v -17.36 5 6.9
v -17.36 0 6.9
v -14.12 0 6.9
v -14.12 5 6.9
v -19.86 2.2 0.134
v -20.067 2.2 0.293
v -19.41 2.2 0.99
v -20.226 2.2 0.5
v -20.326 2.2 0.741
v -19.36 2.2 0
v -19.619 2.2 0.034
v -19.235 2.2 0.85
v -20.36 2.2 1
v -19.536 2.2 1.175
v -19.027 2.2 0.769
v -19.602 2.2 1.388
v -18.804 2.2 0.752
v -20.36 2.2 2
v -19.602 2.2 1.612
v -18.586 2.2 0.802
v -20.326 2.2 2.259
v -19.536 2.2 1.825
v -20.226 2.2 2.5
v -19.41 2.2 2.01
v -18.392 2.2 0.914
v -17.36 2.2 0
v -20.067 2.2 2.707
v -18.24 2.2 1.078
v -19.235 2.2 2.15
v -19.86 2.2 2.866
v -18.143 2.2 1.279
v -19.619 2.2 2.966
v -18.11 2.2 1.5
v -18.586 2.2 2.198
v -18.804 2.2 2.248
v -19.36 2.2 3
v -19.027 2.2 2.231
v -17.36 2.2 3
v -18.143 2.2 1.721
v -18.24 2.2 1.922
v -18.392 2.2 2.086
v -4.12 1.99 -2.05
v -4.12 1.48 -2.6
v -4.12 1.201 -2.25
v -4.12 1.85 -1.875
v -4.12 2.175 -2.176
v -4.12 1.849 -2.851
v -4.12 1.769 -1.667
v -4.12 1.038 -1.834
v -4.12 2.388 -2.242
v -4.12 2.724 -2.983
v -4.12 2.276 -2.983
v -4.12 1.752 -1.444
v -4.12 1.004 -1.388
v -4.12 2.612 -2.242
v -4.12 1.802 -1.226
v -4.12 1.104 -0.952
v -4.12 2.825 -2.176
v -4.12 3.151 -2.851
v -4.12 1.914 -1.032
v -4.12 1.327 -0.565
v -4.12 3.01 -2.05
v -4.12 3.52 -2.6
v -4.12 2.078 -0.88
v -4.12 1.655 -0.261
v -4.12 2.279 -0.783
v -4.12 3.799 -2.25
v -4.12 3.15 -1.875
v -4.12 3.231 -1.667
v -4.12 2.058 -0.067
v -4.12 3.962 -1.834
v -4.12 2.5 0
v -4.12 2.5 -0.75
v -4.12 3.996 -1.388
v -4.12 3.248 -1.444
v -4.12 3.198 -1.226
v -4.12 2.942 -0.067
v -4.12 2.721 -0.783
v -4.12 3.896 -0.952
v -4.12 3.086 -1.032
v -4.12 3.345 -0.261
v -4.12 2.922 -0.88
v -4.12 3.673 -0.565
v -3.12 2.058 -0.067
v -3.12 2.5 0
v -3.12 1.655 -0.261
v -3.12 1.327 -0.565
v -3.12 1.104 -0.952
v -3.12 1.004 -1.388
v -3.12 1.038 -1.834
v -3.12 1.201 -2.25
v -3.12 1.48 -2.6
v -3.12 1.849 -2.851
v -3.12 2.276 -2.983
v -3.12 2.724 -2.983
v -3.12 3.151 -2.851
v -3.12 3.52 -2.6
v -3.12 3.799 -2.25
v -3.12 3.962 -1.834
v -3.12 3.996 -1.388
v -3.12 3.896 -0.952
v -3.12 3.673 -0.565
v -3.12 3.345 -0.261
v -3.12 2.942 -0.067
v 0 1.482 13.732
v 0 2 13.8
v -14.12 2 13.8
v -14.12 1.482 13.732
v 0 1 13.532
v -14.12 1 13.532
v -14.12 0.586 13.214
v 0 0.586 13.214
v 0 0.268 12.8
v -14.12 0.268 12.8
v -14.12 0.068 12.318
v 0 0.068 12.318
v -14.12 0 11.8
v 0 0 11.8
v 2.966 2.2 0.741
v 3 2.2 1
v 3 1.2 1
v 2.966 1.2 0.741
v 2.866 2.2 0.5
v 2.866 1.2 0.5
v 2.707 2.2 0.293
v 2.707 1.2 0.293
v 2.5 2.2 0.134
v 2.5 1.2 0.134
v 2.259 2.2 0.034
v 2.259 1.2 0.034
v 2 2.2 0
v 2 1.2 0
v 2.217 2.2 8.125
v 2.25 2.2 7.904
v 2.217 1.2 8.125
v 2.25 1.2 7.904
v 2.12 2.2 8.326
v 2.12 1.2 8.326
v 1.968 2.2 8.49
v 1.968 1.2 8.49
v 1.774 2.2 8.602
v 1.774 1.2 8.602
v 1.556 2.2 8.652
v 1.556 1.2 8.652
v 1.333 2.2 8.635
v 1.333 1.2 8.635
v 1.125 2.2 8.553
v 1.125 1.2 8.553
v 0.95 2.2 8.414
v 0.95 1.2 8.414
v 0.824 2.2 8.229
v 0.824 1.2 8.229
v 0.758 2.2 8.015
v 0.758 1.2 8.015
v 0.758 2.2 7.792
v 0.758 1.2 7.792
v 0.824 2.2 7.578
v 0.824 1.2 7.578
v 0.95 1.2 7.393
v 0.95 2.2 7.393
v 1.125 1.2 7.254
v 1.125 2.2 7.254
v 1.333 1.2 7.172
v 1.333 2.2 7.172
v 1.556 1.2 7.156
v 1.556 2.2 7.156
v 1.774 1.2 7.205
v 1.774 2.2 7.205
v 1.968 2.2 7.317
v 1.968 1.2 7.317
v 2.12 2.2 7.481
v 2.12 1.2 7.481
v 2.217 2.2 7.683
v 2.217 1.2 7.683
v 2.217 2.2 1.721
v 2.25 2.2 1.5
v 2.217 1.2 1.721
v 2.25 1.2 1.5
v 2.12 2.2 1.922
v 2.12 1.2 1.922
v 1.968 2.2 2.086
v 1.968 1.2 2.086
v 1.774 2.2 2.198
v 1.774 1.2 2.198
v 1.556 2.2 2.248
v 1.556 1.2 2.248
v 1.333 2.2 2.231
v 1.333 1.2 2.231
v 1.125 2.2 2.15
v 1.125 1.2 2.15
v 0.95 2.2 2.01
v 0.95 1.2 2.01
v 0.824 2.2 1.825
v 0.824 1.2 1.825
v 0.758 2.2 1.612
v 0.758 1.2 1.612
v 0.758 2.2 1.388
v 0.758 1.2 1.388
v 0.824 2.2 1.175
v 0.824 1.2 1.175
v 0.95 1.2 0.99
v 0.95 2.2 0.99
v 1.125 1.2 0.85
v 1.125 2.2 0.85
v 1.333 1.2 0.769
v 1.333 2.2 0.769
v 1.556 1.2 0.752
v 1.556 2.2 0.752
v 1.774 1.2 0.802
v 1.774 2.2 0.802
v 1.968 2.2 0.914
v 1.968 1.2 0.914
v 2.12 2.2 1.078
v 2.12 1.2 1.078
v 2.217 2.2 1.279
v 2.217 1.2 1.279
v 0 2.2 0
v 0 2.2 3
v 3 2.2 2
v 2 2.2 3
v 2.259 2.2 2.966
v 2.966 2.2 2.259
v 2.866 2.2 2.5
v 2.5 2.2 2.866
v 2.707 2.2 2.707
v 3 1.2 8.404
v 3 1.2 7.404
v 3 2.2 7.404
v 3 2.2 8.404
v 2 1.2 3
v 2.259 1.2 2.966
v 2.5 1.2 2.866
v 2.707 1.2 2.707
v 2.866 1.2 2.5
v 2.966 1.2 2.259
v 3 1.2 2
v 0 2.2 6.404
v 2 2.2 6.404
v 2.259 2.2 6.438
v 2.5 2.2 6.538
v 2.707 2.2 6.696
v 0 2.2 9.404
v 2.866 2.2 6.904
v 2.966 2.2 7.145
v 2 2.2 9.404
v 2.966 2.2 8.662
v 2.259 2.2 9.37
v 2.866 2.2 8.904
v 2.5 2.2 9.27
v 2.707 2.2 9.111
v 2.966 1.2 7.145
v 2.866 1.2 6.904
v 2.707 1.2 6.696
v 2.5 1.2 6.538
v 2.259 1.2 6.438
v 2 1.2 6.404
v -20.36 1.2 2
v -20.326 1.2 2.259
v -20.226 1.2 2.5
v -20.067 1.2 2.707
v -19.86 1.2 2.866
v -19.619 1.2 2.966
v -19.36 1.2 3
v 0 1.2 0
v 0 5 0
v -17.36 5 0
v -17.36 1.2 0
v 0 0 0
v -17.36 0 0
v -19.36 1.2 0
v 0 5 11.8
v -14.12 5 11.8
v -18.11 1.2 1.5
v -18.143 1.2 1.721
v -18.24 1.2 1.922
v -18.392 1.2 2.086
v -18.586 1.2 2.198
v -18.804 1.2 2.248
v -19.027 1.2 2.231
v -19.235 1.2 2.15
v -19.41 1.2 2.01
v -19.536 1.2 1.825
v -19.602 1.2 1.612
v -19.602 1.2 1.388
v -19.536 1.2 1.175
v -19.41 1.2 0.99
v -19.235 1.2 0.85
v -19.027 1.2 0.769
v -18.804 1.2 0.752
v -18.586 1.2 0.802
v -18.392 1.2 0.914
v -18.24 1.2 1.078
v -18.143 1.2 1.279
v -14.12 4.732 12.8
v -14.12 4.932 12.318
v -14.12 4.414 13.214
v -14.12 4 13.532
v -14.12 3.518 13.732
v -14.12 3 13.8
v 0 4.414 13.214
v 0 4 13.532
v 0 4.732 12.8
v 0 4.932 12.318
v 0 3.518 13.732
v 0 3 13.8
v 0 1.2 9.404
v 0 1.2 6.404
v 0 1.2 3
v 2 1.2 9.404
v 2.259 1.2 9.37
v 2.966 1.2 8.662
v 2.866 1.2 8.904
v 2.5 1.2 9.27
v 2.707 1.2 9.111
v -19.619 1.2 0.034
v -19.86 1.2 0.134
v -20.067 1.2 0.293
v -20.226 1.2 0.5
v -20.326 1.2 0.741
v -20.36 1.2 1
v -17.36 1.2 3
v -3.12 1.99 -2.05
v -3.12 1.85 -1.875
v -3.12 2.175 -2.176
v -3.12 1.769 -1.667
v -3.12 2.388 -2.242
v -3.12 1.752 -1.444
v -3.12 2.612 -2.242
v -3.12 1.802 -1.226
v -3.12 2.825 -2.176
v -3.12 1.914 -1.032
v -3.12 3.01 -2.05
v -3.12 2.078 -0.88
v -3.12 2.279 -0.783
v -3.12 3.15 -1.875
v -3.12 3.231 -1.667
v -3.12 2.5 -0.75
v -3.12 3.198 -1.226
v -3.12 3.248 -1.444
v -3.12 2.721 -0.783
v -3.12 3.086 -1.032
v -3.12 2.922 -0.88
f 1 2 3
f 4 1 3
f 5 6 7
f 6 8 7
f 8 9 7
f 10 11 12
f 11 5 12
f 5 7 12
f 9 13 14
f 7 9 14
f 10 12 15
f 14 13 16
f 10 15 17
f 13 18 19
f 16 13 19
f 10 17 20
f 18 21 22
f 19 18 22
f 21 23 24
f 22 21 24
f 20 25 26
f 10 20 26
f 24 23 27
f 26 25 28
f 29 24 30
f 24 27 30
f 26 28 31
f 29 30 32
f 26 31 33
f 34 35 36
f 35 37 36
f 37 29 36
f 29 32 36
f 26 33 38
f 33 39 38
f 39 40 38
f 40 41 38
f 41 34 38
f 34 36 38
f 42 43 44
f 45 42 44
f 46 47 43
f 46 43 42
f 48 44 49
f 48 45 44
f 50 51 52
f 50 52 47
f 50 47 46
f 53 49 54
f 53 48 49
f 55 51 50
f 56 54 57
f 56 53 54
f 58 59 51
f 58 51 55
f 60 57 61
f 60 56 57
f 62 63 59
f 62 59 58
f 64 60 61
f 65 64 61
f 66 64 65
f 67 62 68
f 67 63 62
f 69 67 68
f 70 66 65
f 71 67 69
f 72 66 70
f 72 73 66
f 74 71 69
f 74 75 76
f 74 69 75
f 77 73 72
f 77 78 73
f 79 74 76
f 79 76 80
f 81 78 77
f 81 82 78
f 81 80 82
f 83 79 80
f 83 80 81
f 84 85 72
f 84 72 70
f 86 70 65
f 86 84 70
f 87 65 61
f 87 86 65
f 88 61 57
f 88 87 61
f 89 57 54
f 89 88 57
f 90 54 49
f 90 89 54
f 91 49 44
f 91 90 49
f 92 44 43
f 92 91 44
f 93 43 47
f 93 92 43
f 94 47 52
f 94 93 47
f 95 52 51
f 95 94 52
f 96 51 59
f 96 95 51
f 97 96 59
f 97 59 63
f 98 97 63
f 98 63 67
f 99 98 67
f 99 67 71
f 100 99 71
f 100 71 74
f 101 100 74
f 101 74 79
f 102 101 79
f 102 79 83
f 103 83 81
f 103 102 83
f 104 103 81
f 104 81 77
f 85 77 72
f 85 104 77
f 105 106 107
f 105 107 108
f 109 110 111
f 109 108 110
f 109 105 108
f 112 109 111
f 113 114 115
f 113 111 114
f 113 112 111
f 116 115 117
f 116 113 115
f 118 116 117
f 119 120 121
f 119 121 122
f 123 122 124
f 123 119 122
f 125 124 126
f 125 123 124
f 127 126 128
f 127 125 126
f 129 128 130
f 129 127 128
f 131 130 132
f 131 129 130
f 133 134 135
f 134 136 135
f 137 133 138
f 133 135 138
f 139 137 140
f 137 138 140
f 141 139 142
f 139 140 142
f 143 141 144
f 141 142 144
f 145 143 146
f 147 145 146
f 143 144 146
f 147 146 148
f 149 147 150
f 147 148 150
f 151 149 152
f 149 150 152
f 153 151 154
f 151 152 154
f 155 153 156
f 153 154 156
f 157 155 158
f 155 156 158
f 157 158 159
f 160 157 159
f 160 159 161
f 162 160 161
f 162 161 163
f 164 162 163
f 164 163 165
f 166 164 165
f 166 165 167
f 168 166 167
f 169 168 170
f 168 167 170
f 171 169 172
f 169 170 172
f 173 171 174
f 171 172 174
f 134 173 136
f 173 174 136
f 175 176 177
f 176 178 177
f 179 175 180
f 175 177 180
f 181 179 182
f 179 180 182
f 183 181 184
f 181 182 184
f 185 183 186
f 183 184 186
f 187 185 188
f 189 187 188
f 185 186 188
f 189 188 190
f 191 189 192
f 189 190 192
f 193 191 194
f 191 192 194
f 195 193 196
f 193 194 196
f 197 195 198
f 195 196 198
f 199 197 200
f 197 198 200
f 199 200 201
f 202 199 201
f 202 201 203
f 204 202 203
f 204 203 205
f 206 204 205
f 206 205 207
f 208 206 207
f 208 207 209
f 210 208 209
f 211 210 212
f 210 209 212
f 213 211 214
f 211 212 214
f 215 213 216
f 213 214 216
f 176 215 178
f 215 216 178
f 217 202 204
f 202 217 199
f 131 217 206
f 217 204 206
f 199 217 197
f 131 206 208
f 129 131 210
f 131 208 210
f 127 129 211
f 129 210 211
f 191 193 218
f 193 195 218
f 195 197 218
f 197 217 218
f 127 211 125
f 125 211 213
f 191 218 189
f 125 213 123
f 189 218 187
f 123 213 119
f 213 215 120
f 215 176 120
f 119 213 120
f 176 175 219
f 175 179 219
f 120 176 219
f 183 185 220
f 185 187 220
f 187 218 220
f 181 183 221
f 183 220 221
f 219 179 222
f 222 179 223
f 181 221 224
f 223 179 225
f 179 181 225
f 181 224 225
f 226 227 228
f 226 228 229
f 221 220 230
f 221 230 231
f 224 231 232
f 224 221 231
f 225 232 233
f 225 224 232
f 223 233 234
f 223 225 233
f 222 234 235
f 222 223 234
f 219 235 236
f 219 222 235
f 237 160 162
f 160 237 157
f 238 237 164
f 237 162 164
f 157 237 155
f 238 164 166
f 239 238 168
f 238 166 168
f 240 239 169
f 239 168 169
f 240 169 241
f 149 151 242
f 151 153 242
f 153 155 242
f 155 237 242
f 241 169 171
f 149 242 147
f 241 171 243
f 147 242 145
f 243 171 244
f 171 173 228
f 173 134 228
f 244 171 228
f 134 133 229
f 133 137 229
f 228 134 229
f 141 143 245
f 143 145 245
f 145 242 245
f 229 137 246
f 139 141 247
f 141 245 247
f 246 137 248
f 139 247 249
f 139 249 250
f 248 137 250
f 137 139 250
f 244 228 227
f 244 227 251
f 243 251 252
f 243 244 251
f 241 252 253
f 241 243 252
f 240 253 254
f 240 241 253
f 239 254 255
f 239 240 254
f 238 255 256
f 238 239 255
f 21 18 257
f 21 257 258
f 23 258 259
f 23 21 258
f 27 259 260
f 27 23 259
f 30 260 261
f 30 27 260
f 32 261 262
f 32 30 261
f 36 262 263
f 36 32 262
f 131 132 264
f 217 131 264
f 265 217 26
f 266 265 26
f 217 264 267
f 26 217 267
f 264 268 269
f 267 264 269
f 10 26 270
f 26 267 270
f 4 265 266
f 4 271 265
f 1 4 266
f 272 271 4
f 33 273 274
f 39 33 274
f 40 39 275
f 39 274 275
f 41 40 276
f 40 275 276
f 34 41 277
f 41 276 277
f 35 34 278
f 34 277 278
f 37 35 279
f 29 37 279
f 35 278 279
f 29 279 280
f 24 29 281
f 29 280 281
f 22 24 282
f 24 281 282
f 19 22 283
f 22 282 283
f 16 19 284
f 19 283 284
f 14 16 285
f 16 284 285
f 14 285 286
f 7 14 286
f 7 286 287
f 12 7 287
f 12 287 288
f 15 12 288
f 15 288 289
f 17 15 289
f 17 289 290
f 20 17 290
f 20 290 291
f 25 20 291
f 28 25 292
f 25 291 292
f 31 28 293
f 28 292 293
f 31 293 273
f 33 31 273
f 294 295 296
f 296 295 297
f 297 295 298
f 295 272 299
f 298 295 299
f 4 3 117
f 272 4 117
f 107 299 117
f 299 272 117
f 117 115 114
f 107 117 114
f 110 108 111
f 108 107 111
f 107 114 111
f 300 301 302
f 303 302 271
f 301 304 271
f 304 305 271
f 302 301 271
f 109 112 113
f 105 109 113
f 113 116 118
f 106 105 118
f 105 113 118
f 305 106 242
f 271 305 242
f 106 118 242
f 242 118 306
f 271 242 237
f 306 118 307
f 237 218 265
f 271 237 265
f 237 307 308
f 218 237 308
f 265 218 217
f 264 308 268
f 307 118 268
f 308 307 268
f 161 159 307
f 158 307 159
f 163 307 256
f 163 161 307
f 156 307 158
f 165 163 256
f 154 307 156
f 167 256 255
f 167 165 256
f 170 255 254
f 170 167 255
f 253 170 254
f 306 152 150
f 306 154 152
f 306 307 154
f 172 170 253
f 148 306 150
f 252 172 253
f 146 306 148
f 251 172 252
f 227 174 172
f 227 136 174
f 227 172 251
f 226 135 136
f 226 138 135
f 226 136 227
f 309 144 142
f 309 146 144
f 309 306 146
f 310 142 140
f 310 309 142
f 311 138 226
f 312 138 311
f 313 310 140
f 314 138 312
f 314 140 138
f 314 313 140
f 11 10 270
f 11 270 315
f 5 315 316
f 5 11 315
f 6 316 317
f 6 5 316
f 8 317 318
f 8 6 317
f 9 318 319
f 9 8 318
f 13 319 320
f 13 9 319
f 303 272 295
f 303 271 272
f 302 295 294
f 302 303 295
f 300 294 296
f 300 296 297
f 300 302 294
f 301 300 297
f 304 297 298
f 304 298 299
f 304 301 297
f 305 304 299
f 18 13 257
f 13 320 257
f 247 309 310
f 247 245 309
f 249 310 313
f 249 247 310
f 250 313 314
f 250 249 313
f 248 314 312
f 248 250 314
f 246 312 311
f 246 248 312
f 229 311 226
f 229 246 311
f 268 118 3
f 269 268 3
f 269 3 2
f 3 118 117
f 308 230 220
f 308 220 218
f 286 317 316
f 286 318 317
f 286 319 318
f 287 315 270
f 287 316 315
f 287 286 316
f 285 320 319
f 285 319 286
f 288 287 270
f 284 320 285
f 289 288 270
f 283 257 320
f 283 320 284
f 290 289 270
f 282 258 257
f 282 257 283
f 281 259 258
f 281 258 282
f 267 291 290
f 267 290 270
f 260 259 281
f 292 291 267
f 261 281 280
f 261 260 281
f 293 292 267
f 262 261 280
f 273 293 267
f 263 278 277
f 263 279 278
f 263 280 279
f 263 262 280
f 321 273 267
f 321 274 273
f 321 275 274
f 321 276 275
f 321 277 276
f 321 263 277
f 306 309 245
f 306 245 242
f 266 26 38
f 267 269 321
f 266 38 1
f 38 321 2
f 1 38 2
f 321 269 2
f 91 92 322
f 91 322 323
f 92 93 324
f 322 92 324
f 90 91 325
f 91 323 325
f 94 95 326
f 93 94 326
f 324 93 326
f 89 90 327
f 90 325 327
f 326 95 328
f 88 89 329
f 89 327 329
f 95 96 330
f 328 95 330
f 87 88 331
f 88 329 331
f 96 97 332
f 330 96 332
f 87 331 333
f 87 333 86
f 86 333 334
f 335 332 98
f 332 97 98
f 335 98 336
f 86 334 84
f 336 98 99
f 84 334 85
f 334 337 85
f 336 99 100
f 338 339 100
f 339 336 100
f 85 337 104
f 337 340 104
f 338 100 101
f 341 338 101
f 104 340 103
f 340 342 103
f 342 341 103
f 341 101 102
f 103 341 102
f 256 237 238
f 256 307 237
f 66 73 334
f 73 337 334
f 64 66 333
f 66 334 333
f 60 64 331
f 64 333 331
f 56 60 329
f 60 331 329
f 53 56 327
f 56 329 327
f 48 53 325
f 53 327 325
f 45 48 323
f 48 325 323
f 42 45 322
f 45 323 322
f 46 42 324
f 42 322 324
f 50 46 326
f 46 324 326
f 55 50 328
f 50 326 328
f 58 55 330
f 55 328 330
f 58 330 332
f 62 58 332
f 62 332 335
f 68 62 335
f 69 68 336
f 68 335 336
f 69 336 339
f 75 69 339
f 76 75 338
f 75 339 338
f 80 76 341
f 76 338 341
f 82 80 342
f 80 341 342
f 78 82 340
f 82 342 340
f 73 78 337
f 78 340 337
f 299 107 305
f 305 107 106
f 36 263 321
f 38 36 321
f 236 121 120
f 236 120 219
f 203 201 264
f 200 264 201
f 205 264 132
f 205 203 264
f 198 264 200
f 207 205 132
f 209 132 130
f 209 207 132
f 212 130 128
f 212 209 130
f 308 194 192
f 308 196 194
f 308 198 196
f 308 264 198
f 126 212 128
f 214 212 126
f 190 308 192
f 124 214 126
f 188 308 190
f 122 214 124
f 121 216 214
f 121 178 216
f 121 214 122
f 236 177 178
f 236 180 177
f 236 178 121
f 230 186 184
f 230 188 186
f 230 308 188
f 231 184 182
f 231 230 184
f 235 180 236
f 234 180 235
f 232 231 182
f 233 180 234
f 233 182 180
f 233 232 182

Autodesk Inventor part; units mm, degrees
ref_plane "YZ Plane" through (0, 0, 0) normal (1, 0, 0) x (0, 1, 0)
ref_plane "XZ Plane" through (0, 0, 0) normal (0, 1, 0) x (-1, 0, 0)
ref_plane "XY Plane" through (0, 0, 0) normal (0, 0, 1) x (1, 0, 0)
sketch "Sketch1" plane through (0, 0, 0) normal (0, 1, 0) x (-1, 0, 0)
  line L0 (0, 0) -> (17.36, 0)
  line L1 (17.36, 0) -> (17.36, 6.9)
  line L2 (17.36, 6.9) -> (0, 6.9)
  line L3 (0, 6.9) -> (0, 0)
  line L4 (0, 6.9) -> (14.12, 6.9)
  line L5 (14.12, 6.9) -> (14.12, 13.8)
  line L6 (14.12, 13.8) -> (0, 13.8)
  line L7 (0, 13.8) -> (0, 6.9)
  dimension "d0" = 17.36
  dimension "d1" = 6.9
  dimension "d2" = 14.12
  dimension "d3" = 6.9
extrude "Extrusion1" add sketch "Sketch1" along normal blind 5
ref_plane "Work Plane1" through (0, 1.2, 0) normal (0, -1, 0) x (1, 0, 0)
sketch "Sketch2" plane through (0, 1.2, 0) normal (0, -1, 0) x (1, 0, 0)
  line L0 (0, 13.8) -> (0, 0) projected
  line L1 (0, 0) -> (-17.36, 0) projected
  line L2 (-17.36, 0) -> (-17.36, 6.9) projected
  line L3 (-17.36, 6.9) -> (-14.12, 6.9) projected
  line L4 (-14.12, 6.9) -> (-14.12, 13.8) projected
  line L5 (-14.12, 13.8) -> (0, 13.8) projected
  line L6 (0, 0) -> (3, 0)
  line L7 (3, 0) -> (3, 3)
  line L8 (3, 3) -> (0, 3)
  line L9 (0, 3) -> (0, 0)
  line L10 (0, 13.8) -> (0, 0) projected
  line L11 (0, 6.4036) -> (3, 6.4036)
  line L12 (3, 6.4036) -> (3, 9.4036)
  line L13 (3, 9.4036) -> (0, 9.4036)
  line L14 (0, 9.4036) -> (0, 6.4036)
  circle A0 centre (1.5, 1.5) radius 0.75
  circle A1 centre (1.5, 7.9036) radius 0.75
  line L15 (-17.36, 0) -> (-17.36, 6.9) projected
  line L16 (-17.36, 0) -> (-20.36, 0)
  line L17 (-20.36, 0) -> (-20.36, 3)
  line L18 (-20.36, 3) -> (-17.36, 3)
  line L19 (-17.36, 3) -> (-17.36, 0)
  circle A2 centre (-18.86, 1.5) radius 0.75
  dimension "d7" = 3
  dimension "d8" = 3
  dimension "d9" = 3
  dimension "d10" = 3
  dimension "d11" = 1.5
  dimension "d12" = 1.5
  dimension "d13" = 3
  dimension "d14" = 3
  dimension "d15" = 1.5
  dimension "d16" = 20.36
extrude "Extrusion2" add sketch "Sketch2" against normal blind 1 contours L13 L12 L11 L0 | L8 L7 L6 L0 | L2 L16 L17 L18
fillet "Fillet1" radius 1 6 edges at (-20.36, 1.7, 0) (3, 1.7, 9.4036) (3, 1.7, 6.4036) (3, 1.7, 3) (3, 1.7, 0) (-20.36, 1.7, 3)
ref_plane "Work Plane2" through (-3.12, 0, 6.9) normal (-1, 0, 0) x (0, 0, 1)
sketch "Sketch3" plane through (-3.12, 0, 6.9) normal (-1, 0, 0) x (0, 0, 1)
  line L0 (-3.9, 1.2) -> (-6.9, 1.2) projected
  line L1 (-6.9, 0) -> (-6.9, 1.2) projected
  line L2 (-6.9, 0) -> (0, 0) projected
  line L3 (0, 0) -> (0, 5) projected
  line L4 (-6.9, 5) -> (0, 5) projected
  line L5 (-6.9, 2.2) -> (-6.9, 5) projected
  line L6 (-6.9, 2.2) -> (-3.9, 2.2) projected
  line L7 (-3.9, 2.2) -> (-3.9, 1.2) projected
  circle A0 centre (-8.4, 2.5) radius 0.75
  circle A1 centre (-8.4, 2.5) radius 1.5
  line L8 (-6.9, 2.2) -> (-6.9, 5) projected
  dimension "d21" = 1.5
  dimension "d22" = 3
extrude "Extrusion3" add sketch "Sketch3" along normal blind 1 contours A1
fillet "Fillet2" radius 2 2 edges at (-7.06, 5, 13.8) (-7.06, 0, 13.8)
properties part number "00_z-slider_chinese_OPPO"
